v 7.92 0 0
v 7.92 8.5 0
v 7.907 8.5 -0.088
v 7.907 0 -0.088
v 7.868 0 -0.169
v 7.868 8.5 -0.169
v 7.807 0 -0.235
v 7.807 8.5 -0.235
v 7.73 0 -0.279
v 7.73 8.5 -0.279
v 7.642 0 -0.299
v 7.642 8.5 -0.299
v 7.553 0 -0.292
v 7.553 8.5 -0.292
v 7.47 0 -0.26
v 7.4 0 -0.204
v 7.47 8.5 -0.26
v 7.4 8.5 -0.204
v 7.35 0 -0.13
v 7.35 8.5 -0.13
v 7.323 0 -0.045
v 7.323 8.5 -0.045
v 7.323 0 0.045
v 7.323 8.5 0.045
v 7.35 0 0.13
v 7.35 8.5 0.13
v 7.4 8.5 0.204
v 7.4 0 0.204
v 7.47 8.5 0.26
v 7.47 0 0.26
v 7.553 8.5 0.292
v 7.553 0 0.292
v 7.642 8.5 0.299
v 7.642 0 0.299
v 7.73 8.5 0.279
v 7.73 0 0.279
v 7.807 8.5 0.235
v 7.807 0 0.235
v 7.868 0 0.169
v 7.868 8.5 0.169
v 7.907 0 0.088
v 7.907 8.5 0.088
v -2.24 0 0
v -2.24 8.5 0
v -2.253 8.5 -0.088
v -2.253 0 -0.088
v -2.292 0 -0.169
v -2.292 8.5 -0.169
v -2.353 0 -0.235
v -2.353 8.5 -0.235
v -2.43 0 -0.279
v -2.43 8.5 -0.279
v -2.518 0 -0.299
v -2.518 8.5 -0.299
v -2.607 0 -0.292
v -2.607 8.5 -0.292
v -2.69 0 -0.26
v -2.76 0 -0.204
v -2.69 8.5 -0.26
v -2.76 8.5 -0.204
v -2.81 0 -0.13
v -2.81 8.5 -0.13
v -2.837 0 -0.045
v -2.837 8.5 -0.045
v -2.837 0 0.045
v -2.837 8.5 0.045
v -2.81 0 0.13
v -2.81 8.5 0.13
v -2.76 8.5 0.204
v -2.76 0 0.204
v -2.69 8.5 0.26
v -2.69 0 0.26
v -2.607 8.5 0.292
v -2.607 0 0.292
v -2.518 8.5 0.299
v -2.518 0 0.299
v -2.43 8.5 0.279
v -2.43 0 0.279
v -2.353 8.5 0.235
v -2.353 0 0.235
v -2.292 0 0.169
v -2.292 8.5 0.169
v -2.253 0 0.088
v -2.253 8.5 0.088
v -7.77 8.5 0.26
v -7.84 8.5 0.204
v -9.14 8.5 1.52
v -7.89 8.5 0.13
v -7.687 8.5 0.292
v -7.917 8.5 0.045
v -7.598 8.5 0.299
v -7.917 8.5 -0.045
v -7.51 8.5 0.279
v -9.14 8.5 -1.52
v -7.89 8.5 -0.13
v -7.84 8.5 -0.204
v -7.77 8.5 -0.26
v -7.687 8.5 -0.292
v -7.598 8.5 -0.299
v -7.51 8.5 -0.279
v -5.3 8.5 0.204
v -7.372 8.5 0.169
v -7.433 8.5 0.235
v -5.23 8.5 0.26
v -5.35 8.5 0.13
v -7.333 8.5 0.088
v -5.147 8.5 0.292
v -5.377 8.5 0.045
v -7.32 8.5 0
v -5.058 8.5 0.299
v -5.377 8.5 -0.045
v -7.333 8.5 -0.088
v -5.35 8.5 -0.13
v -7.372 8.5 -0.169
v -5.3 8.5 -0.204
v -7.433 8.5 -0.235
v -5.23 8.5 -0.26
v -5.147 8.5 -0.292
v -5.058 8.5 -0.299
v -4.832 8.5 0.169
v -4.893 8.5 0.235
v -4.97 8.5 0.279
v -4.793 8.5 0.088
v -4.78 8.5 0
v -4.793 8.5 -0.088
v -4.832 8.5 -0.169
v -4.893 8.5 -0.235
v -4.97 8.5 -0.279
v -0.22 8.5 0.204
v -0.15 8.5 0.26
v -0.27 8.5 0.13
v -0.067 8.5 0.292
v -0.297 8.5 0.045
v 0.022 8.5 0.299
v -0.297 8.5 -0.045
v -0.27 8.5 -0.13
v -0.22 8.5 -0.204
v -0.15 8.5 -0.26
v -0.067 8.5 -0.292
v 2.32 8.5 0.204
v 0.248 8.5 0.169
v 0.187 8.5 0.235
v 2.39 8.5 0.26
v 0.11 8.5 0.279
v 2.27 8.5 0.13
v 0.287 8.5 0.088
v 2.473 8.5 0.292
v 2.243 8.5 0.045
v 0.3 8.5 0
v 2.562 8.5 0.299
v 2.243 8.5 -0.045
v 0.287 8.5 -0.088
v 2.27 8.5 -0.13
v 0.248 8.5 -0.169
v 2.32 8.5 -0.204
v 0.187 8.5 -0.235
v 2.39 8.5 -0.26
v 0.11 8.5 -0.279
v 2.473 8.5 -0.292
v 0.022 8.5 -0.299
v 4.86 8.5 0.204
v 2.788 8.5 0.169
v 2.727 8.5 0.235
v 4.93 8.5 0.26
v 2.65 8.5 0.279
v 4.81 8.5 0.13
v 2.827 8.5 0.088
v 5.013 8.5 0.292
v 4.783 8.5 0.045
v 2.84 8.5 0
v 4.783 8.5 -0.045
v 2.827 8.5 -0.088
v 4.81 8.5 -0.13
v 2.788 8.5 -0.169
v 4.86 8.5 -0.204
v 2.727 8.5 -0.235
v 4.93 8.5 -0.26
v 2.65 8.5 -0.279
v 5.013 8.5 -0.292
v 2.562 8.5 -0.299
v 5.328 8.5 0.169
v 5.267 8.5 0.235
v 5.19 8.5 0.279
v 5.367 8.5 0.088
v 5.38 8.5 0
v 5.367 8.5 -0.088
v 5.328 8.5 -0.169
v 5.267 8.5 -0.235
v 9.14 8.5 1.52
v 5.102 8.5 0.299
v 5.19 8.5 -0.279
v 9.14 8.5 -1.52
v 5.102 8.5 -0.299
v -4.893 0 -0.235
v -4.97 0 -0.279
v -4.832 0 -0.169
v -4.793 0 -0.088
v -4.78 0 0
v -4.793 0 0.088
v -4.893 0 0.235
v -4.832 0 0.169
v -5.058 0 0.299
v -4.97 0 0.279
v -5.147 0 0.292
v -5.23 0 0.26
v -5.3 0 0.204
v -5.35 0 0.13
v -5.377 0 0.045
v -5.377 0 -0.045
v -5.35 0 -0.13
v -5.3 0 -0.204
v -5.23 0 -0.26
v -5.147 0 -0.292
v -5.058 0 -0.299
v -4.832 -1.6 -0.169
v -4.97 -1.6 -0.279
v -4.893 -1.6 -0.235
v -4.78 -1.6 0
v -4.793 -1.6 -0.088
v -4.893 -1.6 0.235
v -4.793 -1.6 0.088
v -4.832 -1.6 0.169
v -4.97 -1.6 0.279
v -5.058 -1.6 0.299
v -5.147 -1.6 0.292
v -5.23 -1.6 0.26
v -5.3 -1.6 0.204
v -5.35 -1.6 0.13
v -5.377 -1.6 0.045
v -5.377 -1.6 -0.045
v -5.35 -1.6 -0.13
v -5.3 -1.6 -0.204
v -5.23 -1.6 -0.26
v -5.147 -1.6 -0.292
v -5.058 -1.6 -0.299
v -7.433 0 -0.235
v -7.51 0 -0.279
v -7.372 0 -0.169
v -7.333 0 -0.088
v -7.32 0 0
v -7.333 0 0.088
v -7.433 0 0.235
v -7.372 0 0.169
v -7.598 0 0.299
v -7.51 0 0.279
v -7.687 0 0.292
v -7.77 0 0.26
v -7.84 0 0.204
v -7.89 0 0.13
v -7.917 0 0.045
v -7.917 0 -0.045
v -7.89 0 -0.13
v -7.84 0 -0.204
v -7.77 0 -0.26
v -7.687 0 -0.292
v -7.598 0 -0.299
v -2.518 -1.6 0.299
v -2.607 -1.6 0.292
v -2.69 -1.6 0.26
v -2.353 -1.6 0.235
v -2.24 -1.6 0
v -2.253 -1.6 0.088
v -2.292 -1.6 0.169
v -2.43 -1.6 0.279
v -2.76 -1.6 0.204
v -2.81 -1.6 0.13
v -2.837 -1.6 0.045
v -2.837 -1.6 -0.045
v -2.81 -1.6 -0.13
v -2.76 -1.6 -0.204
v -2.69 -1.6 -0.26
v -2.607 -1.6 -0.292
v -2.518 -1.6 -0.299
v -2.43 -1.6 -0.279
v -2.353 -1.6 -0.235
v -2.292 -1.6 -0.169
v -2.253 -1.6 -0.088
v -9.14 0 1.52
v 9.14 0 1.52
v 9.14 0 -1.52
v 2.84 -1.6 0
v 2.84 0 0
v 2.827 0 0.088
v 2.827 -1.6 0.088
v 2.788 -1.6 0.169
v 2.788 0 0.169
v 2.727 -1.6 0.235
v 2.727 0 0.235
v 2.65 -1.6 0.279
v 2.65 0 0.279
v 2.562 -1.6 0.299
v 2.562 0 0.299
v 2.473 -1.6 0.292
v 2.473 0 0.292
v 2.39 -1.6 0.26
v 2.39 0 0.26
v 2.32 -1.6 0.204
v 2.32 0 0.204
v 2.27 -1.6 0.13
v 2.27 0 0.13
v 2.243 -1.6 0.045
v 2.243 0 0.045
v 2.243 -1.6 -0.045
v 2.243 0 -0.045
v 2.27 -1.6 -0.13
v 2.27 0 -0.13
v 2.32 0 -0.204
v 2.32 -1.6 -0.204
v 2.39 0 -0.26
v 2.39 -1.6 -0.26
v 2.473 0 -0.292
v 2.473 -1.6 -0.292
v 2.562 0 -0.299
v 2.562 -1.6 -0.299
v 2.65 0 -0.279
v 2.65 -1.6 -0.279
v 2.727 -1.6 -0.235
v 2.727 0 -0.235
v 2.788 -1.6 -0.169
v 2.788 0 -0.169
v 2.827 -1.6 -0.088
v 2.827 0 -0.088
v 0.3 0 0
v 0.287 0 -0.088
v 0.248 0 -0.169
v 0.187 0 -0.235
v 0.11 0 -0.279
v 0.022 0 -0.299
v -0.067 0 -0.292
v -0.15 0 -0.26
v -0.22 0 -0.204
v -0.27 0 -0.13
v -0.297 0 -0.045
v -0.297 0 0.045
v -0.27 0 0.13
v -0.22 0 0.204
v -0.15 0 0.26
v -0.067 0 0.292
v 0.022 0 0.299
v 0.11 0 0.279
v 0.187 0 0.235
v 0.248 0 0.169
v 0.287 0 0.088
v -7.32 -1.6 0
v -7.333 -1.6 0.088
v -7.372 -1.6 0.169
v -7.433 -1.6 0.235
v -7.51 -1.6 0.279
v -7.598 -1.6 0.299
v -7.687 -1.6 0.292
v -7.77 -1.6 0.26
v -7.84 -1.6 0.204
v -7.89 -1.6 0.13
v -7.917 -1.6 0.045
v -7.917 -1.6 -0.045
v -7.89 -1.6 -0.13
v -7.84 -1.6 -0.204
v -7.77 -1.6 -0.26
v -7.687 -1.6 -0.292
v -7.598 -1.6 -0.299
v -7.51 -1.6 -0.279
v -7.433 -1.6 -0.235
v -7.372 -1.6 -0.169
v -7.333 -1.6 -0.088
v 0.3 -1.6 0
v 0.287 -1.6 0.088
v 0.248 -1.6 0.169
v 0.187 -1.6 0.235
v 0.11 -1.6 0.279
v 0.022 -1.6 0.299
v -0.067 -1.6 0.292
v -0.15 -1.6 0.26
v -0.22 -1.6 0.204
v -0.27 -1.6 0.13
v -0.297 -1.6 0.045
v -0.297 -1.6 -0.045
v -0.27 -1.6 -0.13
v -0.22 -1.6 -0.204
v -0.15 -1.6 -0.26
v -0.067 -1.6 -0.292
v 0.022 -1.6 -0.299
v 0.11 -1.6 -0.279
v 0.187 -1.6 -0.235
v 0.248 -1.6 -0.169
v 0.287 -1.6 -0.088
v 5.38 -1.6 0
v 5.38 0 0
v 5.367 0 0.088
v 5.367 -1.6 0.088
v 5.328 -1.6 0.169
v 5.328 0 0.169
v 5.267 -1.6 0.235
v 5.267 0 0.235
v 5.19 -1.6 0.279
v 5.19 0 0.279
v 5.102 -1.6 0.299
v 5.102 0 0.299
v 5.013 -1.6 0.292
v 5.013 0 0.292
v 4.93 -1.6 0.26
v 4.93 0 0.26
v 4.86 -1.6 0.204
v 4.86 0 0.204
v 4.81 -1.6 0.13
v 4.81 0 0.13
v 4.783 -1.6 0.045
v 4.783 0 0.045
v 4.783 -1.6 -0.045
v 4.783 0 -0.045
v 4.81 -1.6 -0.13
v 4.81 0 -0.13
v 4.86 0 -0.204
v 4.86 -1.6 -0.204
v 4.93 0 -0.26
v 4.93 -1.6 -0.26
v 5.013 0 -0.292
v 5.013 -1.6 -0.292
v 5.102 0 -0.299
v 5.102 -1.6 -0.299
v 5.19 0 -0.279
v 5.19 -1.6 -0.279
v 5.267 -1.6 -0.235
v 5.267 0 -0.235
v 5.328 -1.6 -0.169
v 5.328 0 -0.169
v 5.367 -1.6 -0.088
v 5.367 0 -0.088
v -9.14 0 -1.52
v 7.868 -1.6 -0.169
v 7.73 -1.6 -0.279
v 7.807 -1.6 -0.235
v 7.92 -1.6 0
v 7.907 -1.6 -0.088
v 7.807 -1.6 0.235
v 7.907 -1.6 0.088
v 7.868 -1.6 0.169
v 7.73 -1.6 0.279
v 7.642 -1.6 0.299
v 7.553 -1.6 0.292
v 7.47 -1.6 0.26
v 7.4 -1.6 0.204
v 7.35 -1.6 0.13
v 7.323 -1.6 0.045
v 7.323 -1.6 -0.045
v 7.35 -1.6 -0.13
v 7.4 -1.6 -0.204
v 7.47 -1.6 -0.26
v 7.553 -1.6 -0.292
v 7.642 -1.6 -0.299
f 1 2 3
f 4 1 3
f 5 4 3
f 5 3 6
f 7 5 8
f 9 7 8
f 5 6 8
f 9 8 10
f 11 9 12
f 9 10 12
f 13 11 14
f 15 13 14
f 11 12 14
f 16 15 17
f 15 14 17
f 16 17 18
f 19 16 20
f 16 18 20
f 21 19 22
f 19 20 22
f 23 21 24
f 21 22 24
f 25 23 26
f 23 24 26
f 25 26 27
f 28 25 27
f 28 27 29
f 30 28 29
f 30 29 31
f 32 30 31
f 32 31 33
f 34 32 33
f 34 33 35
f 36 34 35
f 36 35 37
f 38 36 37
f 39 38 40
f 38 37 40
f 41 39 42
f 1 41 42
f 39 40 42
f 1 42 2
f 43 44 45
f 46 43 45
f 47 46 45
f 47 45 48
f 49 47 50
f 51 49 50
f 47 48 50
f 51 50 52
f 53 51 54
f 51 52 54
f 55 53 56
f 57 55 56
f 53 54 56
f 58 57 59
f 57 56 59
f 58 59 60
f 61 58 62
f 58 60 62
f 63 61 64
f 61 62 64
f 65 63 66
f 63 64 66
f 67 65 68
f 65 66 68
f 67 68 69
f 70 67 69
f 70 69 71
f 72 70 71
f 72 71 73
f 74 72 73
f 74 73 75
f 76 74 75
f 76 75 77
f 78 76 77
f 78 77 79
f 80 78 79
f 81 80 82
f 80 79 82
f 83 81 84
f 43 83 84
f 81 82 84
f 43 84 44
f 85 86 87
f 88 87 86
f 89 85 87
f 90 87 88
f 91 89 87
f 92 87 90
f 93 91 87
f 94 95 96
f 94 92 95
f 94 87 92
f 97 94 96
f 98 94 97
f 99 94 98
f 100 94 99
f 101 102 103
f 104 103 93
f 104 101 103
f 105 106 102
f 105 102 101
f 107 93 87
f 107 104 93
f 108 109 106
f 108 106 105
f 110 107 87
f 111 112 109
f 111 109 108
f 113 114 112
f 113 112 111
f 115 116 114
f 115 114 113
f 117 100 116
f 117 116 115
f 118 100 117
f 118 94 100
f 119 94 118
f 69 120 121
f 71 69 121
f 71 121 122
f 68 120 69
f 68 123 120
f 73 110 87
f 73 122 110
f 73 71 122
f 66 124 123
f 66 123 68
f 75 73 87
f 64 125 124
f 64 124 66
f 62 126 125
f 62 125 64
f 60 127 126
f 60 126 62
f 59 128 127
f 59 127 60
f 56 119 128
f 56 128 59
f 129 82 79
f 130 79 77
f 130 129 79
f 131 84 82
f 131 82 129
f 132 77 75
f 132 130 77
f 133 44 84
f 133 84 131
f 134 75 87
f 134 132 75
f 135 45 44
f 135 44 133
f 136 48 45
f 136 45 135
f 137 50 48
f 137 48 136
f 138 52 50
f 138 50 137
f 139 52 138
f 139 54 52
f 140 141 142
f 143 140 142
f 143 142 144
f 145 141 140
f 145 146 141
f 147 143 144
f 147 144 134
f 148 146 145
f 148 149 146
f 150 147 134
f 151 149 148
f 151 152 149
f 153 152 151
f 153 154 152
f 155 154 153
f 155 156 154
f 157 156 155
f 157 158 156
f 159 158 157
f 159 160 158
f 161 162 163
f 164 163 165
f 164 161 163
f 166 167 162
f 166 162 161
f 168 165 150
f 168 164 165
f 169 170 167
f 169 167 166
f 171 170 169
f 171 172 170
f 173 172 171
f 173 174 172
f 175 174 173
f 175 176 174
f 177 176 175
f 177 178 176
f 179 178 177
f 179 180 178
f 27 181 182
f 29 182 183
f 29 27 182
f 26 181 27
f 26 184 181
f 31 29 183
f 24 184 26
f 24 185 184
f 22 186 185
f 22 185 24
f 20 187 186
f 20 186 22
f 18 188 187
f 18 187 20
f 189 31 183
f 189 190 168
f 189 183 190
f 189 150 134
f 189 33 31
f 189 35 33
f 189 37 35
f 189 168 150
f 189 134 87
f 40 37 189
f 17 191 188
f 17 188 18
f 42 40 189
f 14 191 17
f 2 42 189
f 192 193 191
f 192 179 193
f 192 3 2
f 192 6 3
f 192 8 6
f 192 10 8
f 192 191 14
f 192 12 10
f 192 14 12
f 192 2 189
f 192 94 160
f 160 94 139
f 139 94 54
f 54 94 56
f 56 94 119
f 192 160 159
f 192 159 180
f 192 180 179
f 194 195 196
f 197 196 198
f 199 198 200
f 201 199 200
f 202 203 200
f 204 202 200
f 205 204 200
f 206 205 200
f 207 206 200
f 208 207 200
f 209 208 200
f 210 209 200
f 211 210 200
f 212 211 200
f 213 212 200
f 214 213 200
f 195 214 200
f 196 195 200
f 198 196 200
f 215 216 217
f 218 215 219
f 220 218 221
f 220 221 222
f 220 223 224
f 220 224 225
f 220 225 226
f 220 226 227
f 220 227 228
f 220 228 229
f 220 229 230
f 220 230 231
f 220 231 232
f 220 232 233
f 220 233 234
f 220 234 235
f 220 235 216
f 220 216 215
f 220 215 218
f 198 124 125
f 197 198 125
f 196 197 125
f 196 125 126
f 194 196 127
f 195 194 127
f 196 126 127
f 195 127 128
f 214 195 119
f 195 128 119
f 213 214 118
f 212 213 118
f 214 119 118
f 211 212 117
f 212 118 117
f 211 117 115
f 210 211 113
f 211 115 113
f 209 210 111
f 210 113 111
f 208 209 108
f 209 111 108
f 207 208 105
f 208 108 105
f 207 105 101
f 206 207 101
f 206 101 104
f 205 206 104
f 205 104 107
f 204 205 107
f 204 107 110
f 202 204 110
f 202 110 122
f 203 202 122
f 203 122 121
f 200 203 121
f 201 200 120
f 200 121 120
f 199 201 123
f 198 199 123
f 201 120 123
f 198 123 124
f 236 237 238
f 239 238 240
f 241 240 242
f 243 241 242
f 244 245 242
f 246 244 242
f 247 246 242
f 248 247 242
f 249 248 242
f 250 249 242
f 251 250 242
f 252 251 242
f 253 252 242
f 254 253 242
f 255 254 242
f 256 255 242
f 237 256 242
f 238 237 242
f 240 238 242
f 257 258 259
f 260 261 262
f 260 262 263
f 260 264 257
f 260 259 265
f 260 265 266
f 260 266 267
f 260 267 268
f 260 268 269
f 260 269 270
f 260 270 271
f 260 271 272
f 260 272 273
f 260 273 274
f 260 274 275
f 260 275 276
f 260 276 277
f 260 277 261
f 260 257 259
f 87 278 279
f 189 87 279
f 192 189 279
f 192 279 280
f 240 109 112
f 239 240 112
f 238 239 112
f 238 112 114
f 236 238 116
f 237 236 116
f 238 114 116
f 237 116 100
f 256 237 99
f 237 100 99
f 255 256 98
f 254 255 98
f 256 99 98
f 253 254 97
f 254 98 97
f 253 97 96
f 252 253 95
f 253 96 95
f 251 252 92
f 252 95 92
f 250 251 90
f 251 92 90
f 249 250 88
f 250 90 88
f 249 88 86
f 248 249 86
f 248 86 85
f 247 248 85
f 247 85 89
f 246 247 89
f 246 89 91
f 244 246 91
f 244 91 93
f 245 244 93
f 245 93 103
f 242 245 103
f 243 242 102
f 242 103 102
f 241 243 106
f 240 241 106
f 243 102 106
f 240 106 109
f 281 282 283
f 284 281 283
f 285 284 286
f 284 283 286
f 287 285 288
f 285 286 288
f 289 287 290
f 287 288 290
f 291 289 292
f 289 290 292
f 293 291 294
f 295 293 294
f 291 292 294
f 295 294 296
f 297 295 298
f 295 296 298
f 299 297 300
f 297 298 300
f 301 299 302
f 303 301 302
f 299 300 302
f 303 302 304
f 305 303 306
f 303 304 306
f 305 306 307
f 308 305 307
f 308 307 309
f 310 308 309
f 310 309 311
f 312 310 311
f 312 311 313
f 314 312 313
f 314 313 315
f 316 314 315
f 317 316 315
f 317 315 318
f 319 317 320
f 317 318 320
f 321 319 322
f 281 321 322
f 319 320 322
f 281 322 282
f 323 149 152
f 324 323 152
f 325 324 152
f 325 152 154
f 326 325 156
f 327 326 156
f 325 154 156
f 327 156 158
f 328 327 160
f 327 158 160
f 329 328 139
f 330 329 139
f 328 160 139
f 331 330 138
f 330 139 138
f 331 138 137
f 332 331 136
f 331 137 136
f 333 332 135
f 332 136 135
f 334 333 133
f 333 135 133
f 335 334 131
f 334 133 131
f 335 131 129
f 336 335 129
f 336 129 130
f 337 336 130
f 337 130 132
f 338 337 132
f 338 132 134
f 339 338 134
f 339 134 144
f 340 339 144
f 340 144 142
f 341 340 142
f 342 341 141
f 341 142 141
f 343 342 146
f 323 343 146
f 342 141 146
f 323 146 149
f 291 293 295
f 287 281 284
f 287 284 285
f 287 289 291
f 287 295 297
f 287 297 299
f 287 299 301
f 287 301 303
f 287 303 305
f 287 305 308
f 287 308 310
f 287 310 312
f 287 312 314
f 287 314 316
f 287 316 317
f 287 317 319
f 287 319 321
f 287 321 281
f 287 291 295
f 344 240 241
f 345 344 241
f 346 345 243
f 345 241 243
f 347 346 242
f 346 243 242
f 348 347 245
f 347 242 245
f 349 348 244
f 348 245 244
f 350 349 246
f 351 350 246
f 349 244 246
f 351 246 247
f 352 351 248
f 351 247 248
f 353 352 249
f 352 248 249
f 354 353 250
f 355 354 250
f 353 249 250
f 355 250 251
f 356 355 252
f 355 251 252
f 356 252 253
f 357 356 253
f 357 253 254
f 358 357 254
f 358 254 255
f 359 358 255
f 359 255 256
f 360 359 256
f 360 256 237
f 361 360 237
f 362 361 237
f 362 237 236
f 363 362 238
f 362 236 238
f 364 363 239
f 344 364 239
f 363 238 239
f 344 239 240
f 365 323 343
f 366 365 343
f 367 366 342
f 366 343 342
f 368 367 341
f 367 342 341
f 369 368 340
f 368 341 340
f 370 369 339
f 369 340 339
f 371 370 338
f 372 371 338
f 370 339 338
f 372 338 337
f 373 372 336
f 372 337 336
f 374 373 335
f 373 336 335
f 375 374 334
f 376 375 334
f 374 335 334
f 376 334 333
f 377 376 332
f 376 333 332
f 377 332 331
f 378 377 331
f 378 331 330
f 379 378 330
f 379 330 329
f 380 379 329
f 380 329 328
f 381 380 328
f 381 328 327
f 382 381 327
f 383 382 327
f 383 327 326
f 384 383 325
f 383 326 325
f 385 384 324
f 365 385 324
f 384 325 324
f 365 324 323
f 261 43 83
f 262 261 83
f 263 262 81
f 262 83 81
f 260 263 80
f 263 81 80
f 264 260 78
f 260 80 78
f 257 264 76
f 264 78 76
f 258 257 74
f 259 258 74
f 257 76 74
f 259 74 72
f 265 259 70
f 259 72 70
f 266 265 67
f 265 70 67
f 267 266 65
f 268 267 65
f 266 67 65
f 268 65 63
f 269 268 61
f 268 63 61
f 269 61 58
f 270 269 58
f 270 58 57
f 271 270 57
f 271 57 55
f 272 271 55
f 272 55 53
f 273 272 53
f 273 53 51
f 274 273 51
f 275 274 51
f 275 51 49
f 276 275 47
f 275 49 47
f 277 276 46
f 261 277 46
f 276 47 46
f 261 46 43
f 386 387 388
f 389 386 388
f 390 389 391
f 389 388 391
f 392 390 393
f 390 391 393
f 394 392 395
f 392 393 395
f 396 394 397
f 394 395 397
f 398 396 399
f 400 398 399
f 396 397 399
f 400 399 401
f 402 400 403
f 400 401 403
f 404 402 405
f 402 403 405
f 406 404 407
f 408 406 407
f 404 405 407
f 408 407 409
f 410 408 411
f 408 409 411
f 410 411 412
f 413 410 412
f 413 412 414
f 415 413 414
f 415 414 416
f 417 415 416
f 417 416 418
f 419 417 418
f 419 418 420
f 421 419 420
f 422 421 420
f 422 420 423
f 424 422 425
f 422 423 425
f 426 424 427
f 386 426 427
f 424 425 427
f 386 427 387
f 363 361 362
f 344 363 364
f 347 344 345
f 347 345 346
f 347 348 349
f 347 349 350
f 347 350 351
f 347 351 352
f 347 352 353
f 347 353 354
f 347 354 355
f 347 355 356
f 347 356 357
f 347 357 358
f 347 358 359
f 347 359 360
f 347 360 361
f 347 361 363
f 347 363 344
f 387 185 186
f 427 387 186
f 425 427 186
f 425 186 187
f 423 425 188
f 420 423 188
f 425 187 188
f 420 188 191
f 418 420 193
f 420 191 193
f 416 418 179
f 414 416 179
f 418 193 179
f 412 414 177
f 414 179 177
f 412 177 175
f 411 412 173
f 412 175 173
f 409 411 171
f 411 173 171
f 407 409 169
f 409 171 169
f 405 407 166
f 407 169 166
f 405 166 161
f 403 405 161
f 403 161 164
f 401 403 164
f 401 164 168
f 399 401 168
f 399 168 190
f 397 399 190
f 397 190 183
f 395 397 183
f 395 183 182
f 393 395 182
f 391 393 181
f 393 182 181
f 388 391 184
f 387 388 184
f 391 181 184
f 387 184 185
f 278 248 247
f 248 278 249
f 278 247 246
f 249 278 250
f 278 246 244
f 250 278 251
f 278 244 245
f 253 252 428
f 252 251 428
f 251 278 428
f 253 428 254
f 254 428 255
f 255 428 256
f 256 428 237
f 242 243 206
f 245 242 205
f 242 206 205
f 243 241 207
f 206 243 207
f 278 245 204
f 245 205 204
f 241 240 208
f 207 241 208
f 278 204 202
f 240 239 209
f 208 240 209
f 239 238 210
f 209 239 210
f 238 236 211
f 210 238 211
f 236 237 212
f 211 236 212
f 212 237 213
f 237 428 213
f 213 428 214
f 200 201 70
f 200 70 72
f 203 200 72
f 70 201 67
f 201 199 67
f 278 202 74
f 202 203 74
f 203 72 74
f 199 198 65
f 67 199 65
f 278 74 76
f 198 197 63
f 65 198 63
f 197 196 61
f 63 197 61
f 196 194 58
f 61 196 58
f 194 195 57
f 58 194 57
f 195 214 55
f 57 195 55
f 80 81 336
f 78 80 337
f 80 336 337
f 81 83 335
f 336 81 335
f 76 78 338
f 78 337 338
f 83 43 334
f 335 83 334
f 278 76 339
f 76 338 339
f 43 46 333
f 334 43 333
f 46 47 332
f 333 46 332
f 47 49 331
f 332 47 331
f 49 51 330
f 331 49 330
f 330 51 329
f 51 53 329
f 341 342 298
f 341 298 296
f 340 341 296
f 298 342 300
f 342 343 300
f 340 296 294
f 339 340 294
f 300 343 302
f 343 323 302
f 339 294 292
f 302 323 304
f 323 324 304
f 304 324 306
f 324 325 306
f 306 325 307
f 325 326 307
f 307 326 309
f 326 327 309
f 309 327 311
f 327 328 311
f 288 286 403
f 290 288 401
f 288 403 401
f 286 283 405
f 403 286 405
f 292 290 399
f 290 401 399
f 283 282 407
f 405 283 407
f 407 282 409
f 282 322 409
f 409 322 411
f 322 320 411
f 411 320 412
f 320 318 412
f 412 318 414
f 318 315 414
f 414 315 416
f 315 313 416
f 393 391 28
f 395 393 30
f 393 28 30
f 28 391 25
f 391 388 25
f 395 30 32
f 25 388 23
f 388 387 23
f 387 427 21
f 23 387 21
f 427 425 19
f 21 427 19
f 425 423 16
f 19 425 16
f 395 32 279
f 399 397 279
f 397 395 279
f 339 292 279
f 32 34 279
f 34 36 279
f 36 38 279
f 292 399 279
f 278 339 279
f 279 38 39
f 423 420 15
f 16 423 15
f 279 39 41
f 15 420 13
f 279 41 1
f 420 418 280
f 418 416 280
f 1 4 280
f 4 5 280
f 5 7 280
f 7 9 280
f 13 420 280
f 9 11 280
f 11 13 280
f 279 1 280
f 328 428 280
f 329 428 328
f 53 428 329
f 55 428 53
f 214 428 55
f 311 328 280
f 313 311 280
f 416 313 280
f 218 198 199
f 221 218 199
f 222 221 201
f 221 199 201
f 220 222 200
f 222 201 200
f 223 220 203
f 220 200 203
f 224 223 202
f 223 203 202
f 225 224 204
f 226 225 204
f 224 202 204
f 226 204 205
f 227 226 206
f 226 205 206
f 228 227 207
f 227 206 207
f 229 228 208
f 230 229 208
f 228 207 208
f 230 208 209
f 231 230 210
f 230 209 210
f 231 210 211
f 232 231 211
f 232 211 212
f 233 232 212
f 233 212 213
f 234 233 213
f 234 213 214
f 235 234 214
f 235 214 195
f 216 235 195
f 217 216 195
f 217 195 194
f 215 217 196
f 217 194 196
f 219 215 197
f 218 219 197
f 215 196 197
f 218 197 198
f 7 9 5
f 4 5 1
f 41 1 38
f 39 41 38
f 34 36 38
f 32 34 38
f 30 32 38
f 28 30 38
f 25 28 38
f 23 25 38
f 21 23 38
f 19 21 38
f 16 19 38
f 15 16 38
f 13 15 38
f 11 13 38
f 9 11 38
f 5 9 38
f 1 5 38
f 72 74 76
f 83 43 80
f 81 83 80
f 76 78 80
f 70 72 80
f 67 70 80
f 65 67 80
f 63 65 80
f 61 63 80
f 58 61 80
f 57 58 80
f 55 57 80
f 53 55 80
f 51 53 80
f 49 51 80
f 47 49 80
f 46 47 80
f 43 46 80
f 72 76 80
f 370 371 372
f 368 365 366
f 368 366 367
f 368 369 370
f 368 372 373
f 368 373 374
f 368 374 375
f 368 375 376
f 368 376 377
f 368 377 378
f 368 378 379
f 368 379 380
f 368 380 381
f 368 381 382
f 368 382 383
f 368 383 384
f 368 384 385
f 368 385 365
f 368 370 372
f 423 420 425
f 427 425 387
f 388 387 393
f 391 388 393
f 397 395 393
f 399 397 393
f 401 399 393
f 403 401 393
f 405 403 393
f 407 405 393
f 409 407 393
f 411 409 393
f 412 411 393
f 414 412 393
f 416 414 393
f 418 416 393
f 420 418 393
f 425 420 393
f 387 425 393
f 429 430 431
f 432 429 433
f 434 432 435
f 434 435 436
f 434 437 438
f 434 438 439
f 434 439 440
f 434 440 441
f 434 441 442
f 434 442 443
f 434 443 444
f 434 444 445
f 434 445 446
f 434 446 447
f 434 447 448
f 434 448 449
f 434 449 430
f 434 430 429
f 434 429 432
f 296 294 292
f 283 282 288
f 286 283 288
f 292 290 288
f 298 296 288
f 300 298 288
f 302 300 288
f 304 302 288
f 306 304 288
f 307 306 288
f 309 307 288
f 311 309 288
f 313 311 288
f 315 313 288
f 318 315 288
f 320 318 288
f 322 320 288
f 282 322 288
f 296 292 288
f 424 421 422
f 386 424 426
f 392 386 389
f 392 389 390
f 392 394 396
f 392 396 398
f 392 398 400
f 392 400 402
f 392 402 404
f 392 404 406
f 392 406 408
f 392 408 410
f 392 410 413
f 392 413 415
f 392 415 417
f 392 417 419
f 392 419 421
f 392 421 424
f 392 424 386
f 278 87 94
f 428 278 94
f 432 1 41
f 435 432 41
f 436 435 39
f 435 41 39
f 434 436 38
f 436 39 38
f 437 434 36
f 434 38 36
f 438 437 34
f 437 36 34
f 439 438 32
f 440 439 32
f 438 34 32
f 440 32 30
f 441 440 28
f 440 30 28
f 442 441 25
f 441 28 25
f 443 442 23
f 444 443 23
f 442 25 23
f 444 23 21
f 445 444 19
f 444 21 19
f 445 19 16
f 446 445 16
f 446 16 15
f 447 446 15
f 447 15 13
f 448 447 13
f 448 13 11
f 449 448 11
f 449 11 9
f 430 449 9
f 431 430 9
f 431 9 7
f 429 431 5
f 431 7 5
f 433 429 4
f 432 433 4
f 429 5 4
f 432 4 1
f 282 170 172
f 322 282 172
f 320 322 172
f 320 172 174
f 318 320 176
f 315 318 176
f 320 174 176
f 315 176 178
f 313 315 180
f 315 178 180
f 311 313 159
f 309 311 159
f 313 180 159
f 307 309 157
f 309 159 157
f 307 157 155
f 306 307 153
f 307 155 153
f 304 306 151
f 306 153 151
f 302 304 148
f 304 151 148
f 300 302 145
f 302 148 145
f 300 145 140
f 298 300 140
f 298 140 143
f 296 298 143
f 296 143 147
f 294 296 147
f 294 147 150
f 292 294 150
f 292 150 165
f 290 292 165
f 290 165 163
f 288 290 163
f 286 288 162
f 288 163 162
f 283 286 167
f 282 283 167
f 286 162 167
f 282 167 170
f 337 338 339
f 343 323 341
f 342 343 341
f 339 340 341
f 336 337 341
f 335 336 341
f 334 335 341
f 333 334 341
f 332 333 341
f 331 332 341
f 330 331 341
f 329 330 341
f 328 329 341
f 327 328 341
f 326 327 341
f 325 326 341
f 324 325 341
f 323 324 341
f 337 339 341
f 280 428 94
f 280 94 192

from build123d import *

# Parameters (mm, degrees)
SKETCH_1_W          = 18.28
SKETCH_1_H          = 3.04
EXTRUDE_1_DEPTH     = 8.5
SKETCH_2_R          = 0.3
CUT_EXTRUDE_1_DEPTH = 8.5
SKETCH_3_R          = 0.3
EXTRUDE_2_DEPTH     = 1.6
EXTRUDE_2_2_DEPTH   = 1.6
EXTRUDE_2_3_DEPTH   = 1.6
EXTRUDE_2_4_DEPTH   = 1.6
EXTRUDE_2_5_DEPTH   = 1.6
EXTRUDE_2_6_DEPTH   = 1.6
EXTRUDE_2_7_DEPTH   = 1.6


with BuildPart() as part:
    # Эскиз1 → Бобышка-Вытянуть1 (new body)
    with BuildSketch(Plane(origin=(0, 0, 0), x_dir=(1, 0, 0), z_dir=(0, 1, 0))):
        Rectangle(SKETCH_1_W, SKETCH_1_H)
    extrude(amount=EXTRUDE_1_DEPTH)

    # Эскиз2 → Вырез-Вытянуть1 (cut)
    with BuildSketch(Plane(origin=(0, 8.5, 0), x_dir=(1, 0, 0), z_dir=(0, 1, 0))):
        with Locations((-7.62, 0)):
            Circle(SKETCH_2_R)
        with Locations((-5.08, 0)):
            Circle(SKETCH_2_R)
        with Locations((-2.54, 0)):
            Circle(SKETCH_2_R)
        Circle(SKETCH_2_R)
        with Locations((2.54, 0)):
            Circle(SKETCH_2_R)
        with Locations((5.08, 0)):
            Circle(SKETCH_2_R)
        with Locations((7.62, 0)):
            Circle(SKETCH_2_R)
    extrude(amount=-CUT_EXTRUDE_1_DEPTH, mode=Mode.SUBTRACT)


with BuildPart() as body_2:
    # Эскиз3 → Бобышка-Вытянуть2 (new body)
    with BuildSketch(Plane.XZ):
        with Locations((-7.62, 0)):
            Circle(SKETCH_3_R)
    extrude(amount=EXTRUDE_2_DEPTH)


with BuildPart() as body_3:
    # Эскиз3 → Extrude 2 2 (new body)
    with BuildSketch(Plane.XZ):
        with Locations((-5.08, 0)):
            Circle(SKETCH_3_R)
    extrude(amount=EXTRUDE_2_2_DEPTH)


with BuildPart() as body_4:
    # Эскиз3 → Extrude 2 3 (new body)
    with BuildSketch(Plane.XZ):
        with Locations((-2.54, 0)):
            Circle(SKETCH_3_R)
    extrude(amount=EXTRUDE_2_3_DEPTH)


with BuildPart() as body_5:
    # Эскиз3 → Extrude 2 4 (new body)
    with BuildSketch(Plane.XZ):
        Circle(SKETCH_3_R)
    extrude(amount=EXTRUDE_2_4_DEPTH)


with BuildPart() as body_6:
    # Эскиз3 → Extrude 2 5 (new body)
    with BuildSketch(Plane.XZ):
        with Locations((2.54, 0)):
            Circle(SKETCH_3_R)
    extrude(amount=EXTRUDE_2_5_DEPTH)


with BuildPart() as body_7:
    # Эскиз3 → Extrude 2 6 (new body)
    with BuildSketch(Plane.XZ):
        with Locations((5.08, 0)):
            Circle(SKETCH_3_R)
    extrude(amount=EXTRUDE_2_6_DEPTH)


with BuildPart() as body_8:
    # Эскиз3 → Extrude 2 7 (new body)
    with BuildSketch(Plane.XZ):
        with Locations((7.62, 0)):
            Circle(SKETCH_3_R)
    extrude(amount=EXTRUDE_2_7_DEPTH)


solid = Compound([part.part, body_2.part, body_3.part, body_4.part, body_5.part, body_6.part, body_7.part, body_8.part])
